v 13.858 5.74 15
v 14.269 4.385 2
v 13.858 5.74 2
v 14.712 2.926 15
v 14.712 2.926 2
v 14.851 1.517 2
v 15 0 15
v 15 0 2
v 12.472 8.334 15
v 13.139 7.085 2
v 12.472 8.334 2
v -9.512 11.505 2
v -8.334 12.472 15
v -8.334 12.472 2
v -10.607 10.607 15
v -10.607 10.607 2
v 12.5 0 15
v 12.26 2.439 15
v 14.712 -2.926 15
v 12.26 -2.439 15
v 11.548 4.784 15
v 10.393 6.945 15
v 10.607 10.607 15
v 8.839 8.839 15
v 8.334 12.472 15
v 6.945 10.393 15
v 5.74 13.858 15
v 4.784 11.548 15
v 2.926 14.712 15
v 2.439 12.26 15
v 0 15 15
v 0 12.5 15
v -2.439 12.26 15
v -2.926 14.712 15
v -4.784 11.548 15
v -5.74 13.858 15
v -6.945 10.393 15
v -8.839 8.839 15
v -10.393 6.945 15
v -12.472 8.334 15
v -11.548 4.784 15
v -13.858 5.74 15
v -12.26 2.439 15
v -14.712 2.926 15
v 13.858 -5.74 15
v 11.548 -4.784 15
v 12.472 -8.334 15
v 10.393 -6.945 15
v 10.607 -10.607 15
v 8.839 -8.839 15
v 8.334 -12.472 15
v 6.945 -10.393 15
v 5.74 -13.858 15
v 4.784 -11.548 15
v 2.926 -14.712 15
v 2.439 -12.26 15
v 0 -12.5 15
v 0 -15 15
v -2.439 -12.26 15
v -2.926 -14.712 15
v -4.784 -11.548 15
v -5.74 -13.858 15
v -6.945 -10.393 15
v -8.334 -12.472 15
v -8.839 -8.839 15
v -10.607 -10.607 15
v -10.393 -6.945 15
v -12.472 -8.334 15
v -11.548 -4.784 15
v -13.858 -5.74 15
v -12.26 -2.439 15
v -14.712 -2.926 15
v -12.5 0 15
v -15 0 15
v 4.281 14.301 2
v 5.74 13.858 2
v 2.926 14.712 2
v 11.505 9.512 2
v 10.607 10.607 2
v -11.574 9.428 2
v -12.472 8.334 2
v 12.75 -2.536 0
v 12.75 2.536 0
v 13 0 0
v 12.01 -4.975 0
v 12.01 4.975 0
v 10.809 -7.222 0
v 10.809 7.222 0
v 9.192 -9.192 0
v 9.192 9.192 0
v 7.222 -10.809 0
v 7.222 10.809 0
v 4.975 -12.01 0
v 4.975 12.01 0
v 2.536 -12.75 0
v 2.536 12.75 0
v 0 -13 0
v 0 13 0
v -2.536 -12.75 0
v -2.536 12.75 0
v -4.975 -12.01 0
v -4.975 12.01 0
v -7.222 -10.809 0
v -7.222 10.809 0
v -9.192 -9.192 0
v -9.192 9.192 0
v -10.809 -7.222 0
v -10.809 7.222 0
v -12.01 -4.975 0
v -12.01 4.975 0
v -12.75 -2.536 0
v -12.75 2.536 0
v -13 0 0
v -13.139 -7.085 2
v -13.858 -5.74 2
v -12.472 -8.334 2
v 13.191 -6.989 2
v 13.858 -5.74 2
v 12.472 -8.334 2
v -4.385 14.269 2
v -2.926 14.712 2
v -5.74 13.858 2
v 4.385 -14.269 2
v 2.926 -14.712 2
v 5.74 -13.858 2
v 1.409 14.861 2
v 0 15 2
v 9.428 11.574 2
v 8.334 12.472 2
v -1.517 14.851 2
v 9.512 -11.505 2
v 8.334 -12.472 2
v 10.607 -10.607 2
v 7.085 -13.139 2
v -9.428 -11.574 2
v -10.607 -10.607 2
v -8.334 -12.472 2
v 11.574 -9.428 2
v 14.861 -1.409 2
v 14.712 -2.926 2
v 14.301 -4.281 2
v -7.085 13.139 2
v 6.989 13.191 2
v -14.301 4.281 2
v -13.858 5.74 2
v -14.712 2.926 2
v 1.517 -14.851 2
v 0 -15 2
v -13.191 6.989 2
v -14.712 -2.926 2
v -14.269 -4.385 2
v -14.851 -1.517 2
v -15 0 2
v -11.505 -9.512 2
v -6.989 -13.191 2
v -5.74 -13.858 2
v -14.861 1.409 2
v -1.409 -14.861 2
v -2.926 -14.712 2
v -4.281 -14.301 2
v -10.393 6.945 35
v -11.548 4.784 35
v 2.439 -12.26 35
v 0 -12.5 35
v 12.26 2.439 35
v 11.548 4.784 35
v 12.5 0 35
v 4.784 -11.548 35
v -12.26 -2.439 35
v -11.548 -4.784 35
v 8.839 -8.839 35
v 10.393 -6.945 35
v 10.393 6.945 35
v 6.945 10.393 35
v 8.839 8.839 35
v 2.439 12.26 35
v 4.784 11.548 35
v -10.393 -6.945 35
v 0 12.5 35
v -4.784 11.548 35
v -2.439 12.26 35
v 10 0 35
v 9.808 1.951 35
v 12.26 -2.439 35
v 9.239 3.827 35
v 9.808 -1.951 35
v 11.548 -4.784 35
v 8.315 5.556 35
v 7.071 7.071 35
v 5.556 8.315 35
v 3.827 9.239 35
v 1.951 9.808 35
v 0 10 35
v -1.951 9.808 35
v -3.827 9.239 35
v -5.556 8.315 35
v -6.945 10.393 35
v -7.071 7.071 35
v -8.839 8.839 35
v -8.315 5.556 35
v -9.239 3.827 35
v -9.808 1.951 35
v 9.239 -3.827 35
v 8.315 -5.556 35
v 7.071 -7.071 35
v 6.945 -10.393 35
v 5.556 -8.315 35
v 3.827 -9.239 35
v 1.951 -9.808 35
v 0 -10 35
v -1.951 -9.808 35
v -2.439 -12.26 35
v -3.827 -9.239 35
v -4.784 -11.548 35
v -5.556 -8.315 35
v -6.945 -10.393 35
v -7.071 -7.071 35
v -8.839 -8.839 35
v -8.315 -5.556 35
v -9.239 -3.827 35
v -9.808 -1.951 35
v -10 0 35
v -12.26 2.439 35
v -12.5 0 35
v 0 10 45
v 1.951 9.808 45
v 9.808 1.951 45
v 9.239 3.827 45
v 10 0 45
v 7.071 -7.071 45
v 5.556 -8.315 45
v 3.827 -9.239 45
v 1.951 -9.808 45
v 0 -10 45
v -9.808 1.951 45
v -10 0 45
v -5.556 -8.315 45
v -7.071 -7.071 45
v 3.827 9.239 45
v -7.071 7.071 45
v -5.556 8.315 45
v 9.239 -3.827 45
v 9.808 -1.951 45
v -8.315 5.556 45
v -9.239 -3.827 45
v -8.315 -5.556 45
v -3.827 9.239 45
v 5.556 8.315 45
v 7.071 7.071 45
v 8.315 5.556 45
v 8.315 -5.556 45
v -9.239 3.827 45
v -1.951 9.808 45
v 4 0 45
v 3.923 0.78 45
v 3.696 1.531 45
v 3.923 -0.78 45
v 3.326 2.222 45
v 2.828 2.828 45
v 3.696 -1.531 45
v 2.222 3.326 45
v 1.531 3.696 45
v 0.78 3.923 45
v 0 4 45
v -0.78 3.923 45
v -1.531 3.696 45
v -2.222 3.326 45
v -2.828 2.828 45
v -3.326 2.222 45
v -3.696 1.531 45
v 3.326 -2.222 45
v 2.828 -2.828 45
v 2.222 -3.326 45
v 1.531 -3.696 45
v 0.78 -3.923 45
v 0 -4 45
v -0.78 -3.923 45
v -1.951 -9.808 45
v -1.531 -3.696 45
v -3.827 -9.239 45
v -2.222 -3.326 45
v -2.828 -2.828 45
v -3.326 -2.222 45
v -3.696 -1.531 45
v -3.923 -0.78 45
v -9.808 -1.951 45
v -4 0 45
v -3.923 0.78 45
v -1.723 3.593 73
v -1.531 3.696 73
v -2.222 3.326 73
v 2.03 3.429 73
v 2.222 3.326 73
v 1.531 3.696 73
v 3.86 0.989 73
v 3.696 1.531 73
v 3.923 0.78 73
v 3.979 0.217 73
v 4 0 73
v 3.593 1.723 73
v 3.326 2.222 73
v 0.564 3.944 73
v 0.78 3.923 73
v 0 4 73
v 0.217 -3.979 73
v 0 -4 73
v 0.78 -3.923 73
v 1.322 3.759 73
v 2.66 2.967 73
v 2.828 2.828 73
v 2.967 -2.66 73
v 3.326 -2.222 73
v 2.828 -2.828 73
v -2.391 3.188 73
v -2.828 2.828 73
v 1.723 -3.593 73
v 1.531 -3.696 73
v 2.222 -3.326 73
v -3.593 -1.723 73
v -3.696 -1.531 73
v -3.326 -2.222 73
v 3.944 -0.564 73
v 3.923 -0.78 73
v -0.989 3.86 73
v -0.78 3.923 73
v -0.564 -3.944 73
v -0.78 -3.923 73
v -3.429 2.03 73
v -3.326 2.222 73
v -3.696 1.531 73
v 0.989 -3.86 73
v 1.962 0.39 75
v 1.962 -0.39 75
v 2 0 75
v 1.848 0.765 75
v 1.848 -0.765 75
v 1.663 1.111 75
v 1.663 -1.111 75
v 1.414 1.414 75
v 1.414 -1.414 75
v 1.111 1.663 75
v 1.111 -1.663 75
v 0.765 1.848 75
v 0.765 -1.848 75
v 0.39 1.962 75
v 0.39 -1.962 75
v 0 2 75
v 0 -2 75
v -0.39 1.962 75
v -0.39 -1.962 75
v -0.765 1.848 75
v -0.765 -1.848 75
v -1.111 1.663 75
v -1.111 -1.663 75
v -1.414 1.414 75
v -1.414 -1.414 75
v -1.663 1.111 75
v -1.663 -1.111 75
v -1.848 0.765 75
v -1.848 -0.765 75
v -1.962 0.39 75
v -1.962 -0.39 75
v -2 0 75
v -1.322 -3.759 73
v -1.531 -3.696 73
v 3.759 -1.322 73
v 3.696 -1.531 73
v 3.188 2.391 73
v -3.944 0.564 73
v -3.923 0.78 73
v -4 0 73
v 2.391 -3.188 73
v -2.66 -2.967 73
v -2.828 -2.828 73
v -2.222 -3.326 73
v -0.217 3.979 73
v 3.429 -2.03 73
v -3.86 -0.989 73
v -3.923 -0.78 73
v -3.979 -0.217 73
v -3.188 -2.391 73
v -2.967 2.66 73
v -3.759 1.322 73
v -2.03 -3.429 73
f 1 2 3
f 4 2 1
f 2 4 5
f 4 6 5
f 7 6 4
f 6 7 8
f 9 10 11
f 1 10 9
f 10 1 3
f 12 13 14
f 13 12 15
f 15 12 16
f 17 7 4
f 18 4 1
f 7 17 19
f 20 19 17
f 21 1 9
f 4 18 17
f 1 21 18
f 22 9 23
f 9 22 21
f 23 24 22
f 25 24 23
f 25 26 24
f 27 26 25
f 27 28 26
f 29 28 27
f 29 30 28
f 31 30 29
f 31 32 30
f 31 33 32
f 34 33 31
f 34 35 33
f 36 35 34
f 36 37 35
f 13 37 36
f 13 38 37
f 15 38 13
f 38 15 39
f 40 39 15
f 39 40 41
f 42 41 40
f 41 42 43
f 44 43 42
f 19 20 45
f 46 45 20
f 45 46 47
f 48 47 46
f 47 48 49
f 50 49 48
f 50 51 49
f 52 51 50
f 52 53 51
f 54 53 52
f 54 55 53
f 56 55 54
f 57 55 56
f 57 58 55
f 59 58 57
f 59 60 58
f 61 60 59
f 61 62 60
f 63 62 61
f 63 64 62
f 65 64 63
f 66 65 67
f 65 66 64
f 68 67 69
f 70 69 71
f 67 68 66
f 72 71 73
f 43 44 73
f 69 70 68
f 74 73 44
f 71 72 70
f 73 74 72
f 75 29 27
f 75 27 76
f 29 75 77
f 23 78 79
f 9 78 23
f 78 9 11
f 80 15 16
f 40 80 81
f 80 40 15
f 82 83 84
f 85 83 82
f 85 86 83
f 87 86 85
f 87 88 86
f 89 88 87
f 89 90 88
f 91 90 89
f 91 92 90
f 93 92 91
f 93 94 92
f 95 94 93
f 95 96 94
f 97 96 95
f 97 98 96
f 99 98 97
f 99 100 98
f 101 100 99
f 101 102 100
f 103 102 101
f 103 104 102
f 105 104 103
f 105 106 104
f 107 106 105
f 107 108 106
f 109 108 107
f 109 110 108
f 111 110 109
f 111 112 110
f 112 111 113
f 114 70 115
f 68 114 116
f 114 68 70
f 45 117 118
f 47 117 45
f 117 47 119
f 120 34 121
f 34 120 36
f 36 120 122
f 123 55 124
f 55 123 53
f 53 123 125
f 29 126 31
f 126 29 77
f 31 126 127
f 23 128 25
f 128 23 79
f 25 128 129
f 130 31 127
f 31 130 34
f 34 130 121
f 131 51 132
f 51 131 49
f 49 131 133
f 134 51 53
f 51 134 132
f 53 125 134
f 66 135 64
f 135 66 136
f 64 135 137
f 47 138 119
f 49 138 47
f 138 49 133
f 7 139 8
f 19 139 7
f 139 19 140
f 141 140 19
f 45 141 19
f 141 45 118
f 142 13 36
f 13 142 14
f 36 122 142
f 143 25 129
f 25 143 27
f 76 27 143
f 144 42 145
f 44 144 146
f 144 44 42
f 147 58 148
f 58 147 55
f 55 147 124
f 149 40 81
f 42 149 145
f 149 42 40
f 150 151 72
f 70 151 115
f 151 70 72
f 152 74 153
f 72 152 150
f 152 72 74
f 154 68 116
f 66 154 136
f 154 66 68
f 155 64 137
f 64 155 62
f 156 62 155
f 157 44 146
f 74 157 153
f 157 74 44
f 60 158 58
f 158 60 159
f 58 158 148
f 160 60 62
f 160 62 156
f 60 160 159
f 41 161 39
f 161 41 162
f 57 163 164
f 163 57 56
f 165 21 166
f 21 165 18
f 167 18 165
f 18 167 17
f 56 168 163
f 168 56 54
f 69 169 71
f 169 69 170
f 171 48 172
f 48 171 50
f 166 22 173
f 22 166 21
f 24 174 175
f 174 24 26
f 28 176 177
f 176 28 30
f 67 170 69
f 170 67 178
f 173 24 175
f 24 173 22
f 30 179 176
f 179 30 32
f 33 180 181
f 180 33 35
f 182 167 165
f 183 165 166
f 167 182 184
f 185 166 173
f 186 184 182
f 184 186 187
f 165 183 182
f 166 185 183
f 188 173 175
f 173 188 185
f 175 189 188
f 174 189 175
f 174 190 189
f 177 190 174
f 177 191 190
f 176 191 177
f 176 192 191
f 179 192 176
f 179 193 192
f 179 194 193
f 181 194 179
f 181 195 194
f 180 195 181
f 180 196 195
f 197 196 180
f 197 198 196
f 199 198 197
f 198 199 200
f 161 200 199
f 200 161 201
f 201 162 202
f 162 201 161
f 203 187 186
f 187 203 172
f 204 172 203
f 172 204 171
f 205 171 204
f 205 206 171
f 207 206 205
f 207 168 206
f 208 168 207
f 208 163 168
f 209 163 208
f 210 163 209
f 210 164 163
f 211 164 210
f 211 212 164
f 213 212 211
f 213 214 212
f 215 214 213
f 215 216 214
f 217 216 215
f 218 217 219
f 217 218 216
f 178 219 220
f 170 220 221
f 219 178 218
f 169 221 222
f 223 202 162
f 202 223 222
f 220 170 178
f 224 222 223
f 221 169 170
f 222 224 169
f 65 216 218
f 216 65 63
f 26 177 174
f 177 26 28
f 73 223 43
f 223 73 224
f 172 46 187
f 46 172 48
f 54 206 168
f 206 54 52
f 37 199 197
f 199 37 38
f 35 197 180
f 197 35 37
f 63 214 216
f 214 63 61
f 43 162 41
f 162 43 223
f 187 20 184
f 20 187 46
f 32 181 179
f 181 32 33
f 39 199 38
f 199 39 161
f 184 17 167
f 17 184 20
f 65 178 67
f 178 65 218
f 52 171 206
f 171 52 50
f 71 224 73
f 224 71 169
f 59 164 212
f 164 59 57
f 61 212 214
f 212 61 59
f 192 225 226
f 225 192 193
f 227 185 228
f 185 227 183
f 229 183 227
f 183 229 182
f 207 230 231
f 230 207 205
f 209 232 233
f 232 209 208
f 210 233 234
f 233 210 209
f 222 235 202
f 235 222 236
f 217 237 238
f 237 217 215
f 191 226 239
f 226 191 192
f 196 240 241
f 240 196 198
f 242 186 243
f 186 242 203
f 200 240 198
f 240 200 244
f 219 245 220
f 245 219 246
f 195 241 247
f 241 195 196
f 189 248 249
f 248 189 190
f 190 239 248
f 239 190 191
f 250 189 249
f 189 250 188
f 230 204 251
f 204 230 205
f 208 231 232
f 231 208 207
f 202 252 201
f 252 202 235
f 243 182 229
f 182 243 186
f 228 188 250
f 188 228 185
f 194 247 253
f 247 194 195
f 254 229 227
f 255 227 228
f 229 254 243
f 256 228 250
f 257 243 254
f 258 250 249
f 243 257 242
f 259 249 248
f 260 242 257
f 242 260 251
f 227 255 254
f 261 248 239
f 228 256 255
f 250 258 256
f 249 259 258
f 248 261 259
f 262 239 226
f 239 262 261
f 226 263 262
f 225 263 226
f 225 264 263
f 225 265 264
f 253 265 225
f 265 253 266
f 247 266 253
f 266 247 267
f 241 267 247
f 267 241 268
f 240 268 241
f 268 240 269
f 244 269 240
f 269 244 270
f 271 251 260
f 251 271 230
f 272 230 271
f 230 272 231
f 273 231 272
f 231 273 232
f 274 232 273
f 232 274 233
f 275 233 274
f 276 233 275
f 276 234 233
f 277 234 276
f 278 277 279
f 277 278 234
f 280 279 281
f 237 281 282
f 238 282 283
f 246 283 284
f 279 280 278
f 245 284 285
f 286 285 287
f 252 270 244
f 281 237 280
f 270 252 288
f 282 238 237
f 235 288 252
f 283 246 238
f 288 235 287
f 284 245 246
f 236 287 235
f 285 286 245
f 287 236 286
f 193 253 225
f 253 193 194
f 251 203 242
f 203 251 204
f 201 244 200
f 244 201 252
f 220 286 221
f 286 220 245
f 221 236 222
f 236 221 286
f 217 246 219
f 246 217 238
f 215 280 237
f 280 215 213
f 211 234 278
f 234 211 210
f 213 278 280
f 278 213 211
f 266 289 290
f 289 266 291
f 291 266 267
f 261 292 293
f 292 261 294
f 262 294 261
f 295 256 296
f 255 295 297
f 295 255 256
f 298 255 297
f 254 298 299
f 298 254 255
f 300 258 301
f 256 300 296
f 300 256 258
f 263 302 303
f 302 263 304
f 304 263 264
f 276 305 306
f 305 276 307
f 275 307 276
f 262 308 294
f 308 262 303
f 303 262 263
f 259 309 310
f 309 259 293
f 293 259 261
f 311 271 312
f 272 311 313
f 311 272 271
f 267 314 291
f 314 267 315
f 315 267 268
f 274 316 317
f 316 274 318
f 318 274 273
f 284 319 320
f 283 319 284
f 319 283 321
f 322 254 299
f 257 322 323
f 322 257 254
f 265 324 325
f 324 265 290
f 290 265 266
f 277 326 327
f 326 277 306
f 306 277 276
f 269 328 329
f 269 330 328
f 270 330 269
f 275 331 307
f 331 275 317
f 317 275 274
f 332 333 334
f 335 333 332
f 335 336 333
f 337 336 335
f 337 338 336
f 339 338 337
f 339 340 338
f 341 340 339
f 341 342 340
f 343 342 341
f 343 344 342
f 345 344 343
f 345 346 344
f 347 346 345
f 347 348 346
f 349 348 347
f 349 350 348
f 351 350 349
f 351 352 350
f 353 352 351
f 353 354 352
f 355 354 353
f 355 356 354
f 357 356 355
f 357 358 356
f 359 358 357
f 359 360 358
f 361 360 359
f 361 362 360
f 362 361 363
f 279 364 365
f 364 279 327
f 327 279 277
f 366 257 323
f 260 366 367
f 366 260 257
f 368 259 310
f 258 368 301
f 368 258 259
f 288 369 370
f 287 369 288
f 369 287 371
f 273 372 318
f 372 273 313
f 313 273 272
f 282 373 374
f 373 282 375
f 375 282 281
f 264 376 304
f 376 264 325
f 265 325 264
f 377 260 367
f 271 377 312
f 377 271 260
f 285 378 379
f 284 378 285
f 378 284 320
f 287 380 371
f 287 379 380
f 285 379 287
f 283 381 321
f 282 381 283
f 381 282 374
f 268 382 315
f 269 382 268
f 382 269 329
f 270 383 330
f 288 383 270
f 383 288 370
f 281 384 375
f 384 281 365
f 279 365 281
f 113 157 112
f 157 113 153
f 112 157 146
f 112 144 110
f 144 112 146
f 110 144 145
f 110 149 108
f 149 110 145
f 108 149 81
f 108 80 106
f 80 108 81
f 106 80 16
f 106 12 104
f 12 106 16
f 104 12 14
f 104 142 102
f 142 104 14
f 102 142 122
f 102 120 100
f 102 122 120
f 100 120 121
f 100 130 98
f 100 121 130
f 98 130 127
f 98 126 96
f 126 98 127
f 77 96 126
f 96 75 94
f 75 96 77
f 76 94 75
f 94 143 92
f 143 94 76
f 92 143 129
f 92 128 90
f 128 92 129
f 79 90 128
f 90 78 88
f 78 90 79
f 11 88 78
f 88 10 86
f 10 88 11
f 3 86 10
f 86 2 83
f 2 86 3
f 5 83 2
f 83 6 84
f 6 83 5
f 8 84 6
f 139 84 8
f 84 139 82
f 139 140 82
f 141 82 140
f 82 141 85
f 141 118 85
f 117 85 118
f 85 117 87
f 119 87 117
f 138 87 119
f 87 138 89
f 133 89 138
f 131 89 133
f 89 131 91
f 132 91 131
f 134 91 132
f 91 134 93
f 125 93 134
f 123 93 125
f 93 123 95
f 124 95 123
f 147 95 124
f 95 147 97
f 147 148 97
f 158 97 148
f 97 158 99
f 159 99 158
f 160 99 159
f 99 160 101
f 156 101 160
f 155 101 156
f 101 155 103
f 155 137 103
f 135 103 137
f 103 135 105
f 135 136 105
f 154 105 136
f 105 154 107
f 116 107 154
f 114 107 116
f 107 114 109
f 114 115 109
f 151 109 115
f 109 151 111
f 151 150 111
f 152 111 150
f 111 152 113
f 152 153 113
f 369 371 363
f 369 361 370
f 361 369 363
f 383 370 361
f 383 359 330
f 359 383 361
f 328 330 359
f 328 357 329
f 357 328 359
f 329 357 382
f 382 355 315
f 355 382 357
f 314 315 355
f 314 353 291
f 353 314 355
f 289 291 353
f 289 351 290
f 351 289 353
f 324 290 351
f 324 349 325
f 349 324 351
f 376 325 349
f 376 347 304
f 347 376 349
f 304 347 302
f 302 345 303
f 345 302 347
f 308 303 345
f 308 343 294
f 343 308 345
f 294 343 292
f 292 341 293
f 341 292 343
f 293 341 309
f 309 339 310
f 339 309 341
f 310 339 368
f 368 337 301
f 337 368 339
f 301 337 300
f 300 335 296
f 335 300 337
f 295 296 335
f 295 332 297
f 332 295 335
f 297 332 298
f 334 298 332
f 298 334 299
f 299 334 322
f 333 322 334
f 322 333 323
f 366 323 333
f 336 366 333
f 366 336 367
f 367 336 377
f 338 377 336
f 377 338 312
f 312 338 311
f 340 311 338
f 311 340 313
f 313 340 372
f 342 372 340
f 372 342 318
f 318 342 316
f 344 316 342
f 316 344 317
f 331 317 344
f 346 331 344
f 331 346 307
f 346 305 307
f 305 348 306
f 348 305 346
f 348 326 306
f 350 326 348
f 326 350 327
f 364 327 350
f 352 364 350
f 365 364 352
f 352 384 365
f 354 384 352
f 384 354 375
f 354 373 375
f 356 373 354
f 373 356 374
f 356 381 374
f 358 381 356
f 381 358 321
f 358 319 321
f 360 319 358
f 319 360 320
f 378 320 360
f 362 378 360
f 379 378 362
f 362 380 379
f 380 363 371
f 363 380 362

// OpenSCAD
$fn = 32;

// ----------------------------------------------------------------------
// Stepped shaft: diameters 30, 25, 20, 8 mm, 75 mm long
// ----------------------------------------------------------------------

// --- parameters (mm) ---
d1 = 30;                  // step 1 diameter
len1 = 15;                // step 1 length
d2 = 25;                  // step 2 diameter
len2 = 20;                // step 2 length
d3 = 20;                  // step 3 diameter
len3 = 10;                // step 3 length
d4 = 8;                   // step 4 diameter
len4 = 30;                // step 4 length
total = 75;               // overall length
chamfer = 2;              // end chamfer

difference() {
  /* turned body: stacked cylinders, every step sunk into the bigger one */
  union() {
    cylinder(h = len1, d = d1);
    translate([0, 0, 14.6]) cylinder(h = 20.4, d = d2);
    translate([0, 0, 34.6]) cylinder(h = 10.4, d = d3);
    translate([0, 0, 44.6]) cylinder(h = 30.4, d = d4);
  }
  /* bottom chamfer ring cut */
  rotate_extrude() translate([13, -2.5]) polygon([[0, 0], [4.5, 0], [4.5, 7], [0, 2.5]]);
  /* top chamfer ring cut */
  rotate_extrude() translate([2, 75]) polygon([[0, 0], [4.5, -4.5], [4.5, 2.5], [0, 2.5]]);
}
